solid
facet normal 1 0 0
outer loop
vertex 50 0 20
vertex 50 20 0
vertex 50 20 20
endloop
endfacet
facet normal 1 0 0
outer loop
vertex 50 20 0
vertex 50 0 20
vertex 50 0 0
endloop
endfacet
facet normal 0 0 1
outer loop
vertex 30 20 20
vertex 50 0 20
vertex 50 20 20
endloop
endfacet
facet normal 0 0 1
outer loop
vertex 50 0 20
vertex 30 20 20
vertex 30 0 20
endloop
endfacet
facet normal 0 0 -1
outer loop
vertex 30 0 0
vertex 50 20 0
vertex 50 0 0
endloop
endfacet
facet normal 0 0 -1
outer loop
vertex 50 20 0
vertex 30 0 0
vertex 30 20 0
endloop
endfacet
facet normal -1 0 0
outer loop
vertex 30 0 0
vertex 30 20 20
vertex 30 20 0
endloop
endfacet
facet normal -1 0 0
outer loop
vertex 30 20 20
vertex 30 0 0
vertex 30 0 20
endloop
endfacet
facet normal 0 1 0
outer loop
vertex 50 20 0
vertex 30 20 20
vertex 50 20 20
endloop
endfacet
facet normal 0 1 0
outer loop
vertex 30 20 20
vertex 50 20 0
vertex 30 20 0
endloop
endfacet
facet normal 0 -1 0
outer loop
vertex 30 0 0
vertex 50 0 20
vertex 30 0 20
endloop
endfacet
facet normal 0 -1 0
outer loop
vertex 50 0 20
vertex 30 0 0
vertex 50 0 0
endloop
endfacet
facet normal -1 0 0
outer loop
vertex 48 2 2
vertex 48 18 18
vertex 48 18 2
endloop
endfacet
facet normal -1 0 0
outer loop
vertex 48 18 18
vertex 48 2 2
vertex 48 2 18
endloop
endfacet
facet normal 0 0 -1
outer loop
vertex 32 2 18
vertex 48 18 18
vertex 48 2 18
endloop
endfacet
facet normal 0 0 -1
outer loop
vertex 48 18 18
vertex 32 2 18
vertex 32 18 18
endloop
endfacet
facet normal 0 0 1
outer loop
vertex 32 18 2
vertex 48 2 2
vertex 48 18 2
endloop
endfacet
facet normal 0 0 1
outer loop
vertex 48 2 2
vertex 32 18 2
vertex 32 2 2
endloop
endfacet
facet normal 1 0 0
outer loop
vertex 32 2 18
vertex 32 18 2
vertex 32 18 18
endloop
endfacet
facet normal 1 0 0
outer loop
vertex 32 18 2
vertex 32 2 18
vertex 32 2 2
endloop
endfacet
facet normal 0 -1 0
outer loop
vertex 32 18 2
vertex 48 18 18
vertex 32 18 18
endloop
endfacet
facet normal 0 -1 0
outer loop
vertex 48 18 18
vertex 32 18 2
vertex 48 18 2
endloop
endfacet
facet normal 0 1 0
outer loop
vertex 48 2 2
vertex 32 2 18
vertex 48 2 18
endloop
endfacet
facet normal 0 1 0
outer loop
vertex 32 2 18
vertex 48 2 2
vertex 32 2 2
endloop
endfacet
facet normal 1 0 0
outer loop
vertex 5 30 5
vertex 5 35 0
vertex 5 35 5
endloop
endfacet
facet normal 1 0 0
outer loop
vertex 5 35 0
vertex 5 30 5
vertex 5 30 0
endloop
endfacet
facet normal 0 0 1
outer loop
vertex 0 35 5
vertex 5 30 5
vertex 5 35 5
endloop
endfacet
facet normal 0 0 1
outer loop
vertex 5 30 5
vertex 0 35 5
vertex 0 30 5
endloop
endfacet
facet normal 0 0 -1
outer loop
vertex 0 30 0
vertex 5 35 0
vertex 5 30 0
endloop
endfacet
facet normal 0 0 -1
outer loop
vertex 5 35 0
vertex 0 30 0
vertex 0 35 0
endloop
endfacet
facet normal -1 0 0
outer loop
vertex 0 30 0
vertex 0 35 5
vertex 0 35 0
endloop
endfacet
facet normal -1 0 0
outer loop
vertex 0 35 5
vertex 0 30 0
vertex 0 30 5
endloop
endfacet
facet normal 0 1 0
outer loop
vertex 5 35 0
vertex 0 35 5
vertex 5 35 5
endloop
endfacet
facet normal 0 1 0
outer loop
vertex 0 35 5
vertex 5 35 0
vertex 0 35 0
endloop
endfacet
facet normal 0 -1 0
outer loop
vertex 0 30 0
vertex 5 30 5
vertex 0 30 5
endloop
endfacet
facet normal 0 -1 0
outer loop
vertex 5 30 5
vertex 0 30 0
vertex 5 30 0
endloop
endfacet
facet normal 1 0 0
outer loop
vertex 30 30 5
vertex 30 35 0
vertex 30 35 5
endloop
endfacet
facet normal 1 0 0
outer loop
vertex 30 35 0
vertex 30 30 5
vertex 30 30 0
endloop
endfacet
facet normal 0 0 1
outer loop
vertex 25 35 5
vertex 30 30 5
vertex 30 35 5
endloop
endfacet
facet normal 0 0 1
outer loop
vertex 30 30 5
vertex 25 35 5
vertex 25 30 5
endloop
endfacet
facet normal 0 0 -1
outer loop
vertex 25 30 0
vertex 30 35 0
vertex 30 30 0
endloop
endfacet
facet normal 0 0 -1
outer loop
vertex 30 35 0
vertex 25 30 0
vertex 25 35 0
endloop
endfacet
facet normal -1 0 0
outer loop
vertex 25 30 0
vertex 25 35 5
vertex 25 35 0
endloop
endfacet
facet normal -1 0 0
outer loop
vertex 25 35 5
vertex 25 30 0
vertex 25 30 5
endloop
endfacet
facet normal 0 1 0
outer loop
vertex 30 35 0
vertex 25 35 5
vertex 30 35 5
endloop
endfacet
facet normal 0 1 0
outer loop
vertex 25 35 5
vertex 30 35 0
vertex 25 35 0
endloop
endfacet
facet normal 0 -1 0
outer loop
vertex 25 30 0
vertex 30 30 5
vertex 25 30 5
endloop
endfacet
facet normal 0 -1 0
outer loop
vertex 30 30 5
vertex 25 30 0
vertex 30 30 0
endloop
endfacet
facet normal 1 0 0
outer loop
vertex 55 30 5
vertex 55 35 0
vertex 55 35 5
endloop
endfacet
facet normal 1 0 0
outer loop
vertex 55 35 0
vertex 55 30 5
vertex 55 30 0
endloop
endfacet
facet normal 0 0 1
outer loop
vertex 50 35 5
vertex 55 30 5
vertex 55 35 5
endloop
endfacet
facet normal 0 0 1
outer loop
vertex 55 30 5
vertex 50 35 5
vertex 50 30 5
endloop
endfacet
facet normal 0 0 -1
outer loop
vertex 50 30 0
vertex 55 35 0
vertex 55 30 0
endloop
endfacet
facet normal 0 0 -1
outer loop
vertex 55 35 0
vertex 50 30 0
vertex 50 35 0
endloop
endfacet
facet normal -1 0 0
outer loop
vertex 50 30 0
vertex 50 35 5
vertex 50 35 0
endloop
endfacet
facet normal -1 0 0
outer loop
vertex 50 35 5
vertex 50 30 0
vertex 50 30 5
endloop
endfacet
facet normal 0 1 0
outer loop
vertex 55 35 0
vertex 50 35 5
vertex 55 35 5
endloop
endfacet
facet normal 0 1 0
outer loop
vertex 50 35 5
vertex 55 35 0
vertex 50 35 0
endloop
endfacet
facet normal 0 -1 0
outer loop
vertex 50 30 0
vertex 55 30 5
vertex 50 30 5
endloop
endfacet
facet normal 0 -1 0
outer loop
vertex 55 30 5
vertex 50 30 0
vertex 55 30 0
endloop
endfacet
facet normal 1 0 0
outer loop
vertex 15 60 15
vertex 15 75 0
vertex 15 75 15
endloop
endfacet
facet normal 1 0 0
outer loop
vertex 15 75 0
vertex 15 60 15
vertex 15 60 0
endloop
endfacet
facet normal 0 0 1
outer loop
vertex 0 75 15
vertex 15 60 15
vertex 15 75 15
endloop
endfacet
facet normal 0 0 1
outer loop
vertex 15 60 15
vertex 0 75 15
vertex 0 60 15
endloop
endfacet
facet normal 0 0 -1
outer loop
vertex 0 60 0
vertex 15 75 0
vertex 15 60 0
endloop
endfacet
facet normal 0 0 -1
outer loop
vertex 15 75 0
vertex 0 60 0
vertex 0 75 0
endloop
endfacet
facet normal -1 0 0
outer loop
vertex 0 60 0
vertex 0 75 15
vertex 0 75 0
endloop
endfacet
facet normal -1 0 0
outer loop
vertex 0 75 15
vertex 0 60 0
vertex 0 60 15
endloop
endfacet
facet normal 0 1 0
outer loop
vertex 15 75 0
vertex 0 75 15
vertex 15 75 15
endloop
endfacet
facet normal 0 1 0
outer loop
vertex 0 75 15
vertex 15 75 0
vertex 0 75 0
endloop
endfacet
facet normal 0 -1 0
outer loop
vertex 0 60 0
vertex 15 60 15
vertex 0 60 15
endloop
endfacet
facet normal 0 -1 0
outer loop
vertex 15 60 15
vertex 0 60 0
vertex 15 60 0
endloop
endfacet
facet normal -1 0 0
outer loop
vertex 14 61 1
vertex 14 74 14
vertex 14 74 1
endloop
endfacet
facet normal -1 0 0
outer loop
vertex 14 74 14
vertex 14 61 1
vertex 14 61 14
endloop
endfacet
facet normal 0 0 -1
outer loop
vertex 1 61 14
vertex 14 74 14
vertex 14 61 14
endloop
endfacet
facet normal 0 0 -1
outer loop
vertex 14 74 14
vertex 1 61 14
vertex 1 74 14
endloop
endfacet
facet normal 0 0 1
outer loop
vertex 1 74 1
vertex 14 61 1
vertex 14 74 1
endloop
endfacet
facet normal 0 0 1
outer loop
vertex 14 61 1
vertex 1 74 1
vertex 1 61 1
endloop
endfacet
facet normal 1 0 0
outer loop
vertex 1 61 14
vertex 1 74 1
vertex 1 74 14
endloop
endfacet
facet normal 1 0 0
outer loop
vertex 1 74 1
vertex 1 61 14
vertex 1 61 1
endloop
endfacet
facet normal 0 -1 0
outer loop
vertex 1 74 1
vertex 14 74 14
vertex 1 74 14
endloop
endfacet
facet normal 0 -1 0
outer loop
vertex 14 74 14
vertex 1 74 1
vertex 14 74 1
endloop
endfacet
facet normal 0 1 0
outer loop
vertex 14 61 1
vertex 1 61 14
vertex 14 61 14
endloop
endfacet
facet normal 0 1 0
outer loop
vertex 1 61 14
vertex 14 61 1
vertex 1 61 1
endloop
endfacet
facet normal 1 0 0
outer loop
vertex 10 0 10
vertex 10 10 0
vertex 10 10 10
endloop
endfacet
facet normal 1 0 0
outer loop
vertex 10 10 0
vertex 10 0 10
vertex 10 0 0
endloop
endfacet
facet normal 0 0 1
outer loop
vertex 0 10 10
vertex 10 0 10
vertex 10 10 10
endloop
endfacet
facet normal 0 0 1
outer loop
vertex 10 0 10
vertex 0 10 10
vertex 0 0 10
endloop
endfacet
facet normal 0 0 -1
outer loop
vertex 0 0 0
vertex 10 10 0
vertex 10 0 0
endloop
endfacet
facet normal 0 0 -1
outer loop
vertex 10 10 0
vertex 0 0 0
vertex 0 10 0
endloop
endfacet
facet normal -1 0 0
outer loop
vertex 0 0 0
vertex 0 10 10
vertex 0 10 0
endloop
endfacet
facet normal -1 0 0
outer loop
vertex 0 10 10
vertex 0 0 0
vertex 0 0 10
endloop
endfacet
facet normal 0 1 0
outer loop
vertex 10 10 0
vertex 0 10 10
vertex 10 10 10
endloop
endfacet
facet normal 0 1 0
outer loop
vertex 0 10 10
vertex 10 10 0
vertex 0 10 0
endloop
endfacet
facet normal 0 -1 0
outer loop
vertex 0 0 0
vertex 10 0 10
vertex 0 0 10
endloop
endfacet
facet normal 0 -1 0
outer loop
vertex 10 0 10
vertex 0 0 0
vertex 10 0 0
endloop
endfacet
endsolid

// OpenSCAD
/*
 * moicad Feature Showcase
 * Demonstrates all supported OpenSCAD language features
 */

// ===========================================
// 1. Variables
// ===========================================
base_size = 10;
scale_factor = 1.5;

// ===========================================
// 2. Functions
// ===========================================
function double(x) = x * 2;
function add(a, b) = a + b;

// Using functions in expressions
calculated = double(5) + add(3, 7);  // = 20

// ===========================================
// 3. Modules
// ===========================================
module simple_box(size) {
    cube(size);
}

module positioned_cube(x, y, z, size) {
    translate([x, y, z])
        cube(size);
}

// ===========================================
// 4. Conditional (if/else)
// ===========================================
use_sphere = false;

if (use_sphere) {
    sphere(10);
} else {
    cube(10);
}

// ===========================================
// 5. Expressions
// ===========================================

// Arithmetic
sum = 10 + 5;          // 15
product = 10 * 2;      // 20

// Comparison
is_large = sum > 10;   // true

// Ternary operator
choice = is_large ? 20 : 5;  // 20

// ===========================================
// 6. Built-in Math Functions
// ===========================================
abs_value = abs(-10);       // 10
square_root = sqrt(16);     // 4
power = pow(2, 3);          // 8
minimum = min(5, 10, 3);    // 3

// Trigonometry (in degrees)
angle = 30;
sine = sin(angle);          // 0.5

// ===========================================
// 7. Real Example: Parametric Box
// ===========================================
module hollow_box(outer, wall) {
    inner = outer - wall * 2;

    difference() {
        cube(outer);
        translate([wall, wall, wall])
            cube(inner);
    }
}

// Create the box
translate([30, 0, 0])
    hollow_box(outer=20, wall=2);

// ===========================================
// 8. For Loop
// ===========================================
for (i = [0 : 2]) {
    translate([i * 25, 30, 0])
        cube(5);
}

// ===========================================
// 9. Module with Transformation Children
// ===========================================
module shell(size) {
    difference() {
        cube(size);
        translate([1, 1, 1])
            cube(size - 2);
    }
}

translate([0, 60, 0])
    shell(15);
